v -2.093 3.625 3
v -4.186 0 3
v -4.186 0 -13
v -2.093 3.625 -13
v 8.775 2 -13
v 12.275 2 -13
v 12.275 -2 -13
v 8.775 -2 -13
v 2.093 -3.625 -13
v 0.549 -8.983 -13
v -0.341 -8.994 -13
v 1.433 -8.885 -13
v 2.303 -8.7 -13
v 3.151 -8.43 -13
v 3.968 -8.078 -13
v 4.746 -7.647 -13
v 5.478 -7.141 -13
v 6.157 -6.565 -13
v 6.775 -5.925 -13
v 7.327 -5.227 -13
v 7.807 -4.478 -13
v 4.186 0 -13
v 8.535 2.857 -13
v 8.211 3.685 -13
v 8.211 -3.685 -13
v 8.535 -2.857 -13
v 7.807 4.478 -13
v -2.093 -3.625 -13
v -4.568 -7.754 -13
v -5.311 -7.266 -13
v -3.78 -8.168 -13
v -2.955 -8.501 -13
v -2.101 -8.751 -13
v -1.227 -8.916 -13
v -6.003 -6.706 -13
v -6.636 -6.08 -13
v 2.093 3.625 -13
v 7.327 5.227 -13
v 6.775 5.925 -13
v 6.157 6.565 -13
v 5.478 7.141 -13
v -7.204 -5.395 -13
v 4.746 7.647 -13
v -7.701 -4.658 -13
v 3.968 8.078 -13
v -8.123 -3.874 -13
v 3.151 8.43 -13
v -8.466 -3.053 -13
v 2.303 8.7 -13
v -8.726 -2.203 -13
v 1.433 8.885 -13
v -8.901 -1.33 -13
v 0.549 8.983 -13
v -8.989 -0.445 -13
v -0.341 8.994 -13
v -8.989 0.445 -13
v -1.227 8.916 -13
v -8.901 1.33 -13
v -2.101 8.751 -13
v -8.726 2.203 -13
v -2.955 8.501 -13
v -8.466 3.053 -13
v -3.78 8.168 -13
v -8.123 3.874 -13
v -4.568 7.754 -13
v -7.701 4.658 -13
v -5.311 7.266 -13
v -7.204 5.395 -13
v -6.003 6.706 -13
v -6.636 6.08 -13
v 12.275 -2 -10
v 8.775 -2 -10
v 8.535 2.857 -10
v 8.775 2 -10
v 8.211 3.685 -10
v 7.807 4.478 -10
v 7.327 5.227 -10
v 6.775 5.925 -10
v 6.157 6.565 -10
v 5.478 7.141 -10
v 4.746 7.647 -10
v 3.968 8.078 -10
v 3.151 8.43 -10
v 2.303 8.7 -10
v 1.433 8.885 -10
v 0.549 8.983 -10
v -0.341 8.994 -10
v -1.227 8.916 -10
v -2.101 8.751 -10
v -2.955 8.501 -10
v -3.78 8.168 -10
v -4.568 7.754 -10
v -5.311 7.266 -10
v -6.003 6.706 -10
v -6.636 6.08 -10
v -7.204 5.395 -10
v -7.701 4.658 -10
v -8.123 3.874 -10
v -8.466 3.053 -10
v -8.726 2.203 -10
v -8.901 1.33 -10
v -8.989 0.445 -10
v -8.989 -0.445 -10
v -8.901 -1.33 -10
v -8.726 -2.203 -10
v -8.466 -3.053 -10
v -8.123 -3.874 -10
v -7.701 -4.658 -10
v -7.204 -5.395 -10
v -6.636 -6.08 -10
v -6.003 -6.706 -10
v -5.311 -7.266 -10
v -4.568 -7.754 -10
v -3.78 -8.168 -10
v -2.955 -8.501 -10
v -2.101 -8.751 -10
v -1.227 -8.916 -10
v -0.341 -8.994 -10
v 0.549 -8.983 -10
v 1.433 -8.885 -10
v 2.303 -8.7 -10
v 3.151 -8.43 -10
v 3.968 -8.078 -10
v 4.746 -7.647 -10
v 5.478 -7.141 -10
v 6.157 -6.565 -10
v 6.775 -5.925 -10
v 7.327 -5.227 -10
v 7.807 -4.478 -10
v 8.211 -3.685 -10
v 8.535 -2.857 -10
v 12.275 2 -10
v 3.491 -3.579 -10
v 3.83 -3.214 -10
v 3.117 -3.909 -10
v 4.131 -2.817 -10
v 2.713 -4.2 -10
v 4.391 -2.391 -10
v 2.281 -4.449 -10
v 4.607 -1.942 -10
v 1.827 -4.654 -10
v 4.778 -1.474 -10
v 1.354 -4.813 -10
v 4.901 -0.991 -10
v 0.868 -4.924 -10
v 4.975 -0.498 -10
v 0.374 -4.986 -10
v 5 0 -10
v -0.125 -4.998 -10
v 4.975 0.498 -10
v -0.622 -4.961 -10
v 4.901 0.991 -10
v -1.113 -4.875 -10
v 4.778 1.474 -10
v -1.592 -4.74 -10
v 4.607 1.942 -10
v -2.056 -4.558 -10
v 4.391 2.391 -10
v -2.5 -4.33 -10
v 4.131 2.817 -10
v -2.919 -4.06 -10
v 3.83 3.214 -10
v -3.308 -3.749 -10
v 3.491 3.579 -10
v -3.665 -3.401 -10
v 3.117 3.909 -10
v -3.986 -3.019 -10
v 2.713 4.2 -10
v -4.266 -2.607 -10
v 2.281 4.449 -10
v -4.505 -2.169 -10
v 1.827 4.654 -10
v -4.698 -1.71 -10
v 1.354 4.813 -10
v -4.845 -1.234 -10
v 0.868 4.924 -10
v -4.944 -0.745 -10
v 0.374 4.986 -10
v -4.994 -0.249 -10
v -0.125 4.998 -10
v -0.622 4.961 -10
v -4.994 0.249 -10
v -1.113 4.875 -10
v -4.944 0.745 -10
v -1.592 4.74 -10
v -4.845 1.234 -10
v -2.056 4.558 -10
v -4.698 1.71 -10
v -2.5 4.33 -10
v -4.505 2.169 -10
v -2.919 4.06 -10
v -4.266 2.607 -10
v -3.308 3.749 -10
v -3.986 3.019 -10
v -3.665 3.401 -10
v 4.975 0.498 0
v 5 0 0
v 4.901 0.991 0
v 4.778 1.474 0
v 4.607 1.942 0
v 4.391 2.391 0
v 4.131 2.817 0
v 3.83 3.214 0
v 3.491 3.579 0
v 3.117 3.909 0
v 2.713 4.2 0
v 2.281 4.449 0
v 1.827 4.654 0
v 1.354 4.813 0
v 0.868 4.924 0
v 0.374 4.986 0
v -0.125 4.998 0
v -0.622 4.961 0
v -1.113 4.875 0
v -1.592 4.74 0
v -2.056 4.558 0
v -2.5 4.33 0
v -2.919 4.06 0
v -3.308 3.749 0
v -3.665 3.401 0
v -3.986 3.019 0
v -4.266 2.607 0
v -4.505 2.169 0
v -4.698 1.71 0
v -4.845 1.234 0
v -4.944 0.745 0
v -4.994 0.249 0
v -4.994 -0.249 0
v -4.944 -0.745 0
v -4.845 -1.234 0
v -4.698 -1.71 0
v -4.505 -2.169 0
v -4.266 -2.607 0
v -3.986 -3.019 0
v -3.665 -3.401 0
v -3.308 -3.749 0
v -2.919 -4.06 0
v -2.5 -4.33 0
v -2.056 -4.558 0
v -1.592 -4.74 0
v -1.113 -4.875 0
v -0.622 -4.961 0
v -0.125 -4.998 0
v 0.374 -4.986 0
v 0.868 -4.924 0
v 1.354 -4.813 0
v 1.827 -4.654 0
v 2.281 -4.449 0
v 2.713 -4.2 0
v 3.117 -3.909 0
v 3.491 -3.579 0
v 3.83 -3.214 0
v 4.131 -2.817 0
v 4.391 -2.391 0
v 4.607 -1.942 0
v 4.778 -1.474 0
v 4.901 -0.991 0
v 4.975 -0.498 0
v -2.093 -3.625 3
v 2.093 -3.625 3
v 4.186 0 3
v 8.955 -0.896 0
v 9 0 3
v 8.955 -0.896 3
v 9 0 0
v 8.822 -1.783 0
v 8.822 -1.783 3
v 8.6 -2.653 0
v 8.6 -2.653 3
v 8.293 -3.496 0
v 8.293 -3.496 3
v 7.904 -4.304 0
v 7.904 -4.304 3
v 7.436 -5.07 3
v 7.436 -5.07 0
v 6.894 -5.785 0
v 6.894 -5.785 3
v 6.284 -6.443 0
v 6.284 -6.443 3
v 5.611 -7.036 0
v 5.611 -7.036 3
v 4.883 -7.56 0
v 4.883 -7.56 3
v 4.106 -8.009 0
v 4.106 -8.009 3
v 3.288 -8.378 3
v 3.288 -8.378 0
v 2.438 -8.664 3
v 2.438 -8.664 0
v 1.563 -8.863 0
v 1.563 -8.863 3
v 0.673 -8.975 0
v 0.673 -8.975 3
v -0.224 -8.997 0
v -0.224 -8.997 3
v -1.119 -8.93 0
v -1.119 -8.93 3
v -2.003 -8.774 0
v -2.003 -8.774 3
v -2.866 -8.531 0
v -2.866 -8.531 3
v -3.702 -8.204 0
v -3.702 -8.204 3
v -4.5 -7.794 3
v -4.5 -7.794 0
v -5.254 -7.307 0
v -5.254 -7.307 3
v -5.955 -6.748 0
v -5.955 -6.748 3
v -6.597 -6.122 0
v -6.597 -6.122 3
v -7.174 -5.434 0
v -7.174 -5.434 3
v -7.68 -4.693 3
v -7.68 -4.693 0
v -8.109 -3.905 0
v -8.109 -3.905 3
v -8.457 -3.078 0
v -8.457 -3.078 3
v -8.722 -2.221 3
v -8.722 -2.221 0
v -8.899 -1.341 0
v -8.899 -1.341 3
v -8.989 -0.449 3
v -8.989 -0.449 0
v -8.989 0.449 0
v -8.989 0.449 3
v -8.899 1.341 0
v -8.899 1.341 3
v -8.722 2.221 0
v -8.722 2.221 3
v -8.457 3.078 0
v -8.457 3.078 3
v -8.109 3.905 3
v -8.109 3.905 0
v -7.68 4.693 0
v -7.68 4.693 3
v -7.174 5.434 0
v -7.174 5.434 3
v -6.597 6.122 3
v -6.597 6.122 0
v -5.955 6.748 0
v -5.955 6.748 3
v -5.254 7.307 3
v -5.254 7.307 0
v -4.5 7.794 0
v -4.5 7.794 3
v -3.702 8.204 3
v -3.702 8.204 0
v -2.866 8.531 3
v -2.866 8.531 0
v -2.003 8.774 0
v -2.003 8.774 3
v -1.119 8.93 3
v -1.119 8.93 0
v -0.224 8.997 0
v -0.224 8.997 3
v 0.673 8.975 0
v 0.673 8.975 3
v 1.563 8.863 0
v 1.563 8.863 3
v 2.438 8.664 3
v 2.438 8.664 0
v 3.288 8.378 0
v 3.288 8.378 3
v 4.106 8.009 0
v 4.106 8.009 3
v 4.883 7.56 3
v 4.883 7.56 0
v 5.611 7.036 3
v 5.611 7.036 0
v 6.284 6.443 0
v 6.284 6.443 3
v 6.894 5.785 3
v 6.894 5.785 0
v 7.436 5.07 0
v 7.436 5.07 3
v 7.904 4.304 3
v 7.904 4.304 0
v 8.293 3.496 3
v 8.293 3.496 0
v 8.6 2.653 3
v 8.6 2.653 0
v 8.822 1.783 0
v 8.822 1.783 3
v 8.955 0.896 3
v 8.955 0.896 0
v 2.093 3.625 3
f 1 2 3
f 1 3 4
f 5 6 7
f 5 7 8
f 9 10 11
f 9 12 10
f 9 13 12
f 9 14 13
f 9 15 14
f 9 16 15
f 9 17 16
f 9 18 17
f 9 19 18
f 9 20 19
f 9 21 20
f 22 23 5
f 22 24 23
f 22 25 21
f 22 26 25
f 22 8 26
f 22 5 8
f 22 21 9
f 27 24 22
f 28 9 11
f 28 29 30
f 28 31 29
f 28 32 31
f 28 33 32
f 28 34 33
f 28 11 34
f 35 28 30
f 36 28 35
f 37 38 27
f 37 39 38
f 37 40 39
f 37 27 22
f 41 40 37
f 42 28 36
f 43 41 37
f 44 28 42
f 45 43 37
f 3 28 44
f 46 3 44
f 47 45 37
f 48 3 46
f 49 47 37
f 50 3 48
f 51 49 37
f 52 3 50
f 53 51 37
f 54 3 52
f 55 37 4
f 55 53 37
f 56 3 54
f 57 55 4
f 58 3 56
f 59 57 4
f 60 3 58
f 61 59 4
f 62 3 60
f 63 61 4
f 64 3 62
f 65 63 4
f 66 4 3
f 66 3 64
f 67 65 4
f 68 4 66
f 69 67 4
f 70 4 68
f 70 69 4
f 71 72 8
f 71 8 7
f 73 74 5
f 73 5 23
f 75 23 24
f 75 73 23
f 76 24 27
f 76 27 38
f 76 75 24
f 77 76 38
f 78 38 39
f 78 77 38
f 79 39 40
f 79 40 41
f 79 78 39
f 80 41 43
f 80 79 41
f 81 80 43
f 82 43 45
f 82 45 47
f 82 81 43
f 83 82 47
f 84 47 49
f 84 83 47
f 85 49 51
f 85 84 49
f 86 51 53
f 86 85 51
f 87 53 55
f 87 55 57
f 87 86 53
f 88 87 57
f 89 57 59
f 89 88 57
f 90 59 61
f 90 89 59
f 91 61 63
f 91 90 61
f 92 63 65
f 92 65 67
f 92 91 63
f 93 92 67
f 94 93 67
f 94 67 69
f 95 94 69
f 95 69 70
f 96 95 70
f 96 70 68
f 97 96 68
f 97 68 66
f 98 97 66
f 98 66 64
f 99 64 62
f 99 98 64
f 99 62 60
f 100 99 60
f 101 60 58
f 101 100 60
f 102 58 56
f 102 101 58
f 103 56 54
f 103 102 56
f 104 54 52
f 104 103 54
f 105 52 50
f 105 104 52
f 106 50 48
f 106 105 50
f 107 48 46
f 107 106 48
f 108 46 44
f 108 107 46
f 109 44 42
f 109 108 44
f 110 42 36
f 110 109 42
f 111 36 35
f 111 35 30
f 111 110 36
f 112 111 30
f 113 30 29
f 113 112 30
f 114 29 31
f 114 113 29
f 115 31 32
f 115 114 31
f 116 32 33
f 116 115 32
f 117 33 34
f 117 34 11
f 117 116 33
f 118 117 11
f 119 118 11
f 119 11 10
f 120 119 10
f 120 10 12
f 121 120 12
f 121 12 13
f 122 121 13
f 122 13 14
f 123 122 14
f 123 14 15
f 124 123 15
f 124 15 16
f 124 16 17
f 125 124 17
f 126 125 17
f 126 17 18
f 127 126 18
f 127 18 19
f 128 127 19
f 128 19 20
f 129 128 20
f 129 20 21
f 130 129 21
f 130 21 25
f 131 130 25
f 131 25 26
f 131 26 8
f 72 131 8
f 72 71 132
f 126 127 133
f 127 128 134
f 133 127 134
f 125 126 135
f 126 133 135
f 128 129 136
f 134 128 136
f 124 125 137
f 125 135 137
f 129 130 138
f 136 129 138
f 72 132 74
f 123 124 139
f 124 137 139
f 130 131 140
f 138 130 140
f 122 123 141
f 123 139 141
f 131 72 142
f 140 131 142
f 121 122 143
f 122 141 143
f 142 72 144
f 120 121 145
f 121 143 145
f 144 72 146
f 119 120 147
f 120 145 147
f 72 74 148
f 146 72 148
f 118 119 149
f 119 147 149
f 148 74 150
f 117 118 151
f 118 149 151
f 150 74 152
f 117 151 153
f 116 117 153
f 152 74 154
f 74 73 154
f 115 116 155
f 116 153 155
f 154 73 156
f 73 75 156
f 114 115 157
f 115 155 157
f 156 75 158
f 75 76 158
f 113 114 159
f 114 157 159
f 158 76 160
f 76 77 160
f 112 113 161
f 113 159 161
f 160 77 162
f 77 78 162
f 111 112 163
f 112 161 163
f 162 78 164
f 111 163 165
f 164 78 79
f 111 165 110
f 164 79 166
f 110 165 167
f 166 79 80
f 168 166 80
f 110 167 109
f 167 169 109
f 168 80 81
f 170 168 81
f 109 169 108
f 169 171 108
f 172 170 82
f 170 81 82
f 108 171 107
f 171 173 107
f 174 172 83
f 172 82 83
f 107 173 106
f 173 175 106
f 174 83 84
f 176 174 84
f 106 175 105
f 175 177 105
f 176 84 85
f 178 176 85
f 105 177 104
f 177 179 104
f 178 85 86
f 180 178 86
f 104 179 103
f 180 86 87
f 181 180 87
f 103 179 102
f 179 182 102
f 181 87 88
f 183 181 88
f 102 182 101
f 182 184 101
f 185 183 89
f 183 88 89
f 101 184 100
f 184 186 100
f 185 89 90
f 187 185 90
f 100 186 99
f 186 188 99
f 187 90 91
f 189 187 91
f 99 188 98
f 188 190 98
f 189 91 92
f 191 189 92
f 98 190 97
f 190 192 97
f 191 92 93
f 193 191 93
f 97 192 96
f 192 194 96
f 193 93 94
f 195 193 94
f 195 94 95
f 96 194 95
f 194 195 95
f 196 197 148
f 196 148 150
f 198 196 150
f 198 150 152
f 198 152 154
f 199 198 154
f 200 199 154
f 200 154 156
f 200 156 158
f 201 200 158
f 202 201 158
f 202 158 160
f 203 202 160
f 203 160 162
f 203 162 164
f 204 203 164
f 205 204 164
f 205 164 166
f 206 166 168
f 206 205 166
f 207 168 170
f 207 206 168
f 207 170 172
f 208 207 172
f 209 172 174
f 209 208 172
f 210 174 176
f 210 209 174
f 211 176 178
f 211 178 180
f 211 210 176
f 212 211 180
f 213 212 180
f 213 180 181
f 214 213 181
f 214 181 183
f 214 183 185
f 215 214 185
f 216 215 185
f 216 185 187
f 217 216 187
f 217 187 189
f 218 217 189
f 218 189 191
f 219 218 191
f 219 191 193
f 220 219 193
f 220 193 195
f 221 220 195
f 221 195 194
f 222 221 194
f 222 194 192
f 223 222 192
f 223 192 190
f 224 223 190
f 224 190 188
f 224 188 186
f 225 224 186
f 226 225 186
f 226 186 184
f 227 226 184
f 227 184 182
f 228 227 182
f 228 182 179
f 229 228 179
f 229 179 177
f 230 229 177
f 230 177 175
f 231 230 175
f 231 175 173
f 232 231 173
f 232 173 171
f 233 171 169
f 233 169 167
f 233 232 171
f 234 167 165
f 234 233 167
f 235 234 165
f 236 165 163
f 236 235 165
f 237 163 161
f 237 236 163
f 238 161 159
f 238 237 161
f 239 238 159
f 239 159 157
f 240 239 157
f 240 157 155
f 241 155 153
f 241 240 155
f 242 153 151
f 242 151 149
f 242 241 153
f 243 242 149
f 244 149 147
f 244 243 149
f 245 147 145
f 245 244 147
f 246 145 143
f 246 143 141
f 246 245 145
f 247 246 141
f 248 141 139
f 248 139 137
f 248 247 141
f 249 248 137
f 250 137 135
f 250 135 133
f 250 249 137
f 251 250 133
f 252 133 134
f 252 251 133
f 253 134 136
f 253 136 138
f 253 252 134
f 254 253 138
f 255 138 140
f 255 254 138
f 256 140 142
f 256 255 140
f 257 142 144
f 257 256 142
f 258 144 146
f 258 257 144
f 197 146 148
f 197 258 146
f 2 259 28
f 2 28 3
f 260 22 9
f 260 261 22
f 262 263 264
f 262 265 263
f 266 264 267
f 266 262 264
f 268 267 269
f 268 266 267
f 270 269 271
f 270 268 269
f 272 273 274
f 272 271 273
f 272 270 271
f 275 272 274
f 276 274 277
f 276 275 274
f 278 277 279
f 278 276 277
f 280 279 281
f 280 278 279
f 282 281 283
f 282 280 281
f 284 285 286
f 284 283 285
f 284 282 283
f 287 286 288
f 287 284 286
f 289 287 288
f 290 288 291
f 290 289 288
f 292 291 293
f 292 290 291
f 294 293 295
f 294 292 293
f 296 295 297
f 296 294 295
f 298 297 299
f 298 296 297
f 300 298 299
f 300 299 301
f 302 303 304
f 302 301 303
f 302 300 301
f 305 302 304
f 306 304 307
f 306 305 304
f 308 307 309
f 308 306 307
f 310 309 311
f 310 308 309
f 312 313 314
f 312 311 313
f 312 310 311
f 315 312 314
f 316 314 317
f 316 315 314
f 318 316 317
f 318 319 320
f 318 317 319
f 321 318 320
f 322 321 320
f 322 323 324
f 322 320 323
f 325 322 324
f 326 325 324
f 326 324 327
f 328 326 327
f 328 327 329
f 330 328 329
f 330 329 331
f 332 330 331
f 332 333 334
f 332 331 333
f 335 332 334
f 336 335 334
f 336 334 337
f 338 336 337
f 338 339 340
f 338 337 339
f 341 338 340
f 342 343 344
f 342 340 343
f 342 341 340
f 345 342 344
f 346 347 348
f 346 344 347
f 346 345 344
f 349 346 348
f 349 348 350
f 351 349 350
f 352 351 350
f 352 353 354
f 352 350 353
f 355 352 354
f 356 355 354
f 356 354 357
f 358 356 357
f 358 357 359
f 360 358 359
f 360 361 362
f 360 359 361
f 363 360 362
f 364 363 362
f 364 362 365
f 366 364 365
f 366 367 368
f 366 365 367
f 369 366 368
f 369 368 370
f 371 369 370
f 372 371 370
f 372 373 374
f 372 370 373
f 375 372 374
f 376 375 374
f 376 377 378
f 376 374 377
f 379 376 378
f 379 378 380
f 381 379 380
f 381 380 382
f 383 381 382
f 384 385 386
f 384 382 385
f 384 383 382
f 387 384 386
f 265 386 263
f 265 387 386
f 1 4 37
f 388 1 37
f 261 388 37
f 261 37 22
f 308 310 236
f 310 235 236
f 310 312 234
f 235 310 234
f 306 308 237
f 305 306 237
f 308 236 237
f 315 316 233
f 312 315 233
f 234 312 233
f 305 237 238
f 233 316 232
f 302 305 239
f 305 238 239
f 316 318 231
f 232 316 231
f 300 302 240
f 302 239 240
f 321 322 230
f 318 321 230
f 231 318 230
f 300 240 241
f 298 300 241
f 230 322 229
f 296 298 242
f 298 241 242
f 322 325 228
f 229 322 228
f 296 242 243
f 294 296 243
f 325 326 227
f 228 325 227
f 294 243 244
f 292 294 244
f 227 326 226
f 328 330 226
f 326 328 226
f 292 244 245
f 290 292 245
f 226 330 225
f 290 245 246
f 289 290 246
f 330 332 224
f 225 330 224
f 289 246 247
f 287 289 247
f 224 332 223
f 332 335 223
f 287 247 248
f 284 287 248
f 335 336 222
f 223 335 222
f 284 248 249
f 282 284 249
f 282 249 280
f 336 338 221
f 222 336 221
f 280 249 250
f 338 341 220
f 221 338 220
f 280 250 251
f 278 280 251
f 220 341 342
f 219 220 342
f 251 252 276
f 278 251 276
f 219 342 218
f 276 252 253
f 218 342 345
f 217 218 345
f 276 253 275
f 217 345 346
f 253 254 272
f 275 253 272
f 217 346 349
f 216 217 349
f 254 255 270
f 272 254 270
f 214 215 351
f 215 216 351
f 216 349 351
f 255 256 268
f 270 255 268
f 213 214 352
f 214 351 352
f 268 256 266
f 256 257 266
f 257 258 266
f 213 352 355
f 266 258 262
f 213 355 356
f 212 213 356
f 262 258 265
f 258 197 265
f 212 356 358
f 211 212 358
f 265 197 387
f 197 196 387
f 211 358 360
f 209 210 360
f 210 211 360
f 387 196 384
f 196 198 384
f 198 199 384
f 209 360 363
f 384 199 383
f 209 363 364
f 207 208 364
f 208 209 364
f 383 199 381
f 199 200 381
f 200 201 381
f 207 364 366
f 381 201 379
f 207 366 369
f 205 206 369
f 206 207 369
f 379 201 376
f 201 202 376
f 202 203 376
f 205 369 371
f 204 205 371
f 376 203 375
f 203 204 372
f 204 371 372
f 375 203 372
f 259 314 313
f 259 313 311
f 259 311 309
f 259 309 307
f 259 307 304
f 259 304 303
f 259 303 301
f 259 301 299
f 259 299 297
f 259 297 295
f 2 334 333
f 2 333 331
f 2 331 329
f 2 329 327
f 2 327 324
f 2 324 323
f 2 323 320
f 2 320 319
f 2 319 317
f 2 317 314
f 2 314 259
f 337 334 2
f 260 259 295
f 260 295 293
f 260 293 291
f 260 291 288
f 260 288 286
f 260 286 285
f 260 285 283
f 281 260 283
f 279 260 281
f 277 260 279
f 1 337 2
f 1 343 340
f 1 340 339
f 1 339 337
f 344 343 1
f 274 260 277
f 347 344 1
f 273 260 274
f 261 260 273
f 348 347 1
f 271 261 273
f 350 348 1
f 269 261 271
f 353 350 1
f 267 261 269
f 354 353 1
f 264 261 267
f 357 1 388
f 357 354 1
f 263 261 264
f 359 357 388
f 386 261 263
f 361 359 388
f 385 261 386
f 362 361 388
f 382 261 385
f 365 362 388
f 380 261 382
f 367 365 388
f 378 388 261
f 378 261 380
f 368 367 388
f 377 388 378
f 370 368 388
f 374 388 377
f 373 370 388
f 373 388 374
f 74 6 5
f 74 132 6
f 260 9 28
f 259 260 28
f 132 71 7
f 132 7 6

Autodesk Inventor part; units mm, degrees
ref_plane "YZ Plane" through (0, 0, 0) normal (1, 0, 0) x (0, 1, 0)
ref_plane "XZ Plane" through (0, 0, 0) normal (0, 1, 0) x (-1, 0, 0)
ref_plane "XY Plane" through (0, 0, 0) normal (0, 0, 1) x (1, 0, 0)
sketch "Sketch1" plane through (0, 0, 0) normal (0, 0, 1) x (1, 0, 0)
  circle A0 centre (0, 0) radius 9
  circle A1 centre (0, 0) radius 5
  line L0 (4.1858, 0) -> (2.0929, -3.625)
  line L1 (2.0929, -3.625) -> (-2.0929, -3.625)
  line L2 (-2.0929, -3.625) -> (-4.1858, 0)
  line L3 (-4.1858, 0) -> (-2.0929, 3.625)
  line L4 (-2.0929, 3.625) -> (2.0929, 3.625)
  line L5 (2.0929, 3.625) -> (4.1858, 0)
  dimension "d1" = 18
  dimension "d2" = 10
  dimension "d3" = 7.25
extrude "Extrusion2" add sketch "Sketch1" against normal blind 10 contours A1
extrude "Extrusion4" add sketch "Sketch1" along normal blind 3 contours A0 | A1
sketch "Sketch6" plane through (0, 0, -10) normal (0, 0, -1) x (-1, 0, 0)
  circle A0 centre (0, 0) radius 9 projected
  circle A1 centre (0, 0) radius 5 projected
  line L0 (0, 0) -> (-9, 0) construction
  arc A2 (-8.775, 2) -> (-8.775, -2) centre (0, 0) ccw
  line L1 (-8.775, -2) -> (-12.275, -2)
  line L2 (-12.275, -2) -> (-12.275, 2)
  line L3 (-12.275, 2) -> (-8.775, 2)
  line L4 (-4.1858, 0) -> (-2.0929, 3.625) projected
  line L5 (-2.0929, 3.625) -> (2.0929, 3.625) projected
  line L6 (2.0929, 3.625) -> (4.1858, 0) projected
  line L7 (4.1858, 0) -> (2.0929, -3.625) projected
  line L8 (2.0929, -3.625) -> (-2.0929, -3.625) projected
  line L9 (-2.0929, -3.625) -> (-4.1858, 0) projected
  circle A3 centre (0, 0) radius 5 projected
  dimension "d20" = 3.5
  dimension "d21" = 4
extrude "Extrusion7" add sketch "Sketch6" along normal blind 3 contours A0 | A0 L1 L2 L3 | A1
properties part number "movingSpindle"
